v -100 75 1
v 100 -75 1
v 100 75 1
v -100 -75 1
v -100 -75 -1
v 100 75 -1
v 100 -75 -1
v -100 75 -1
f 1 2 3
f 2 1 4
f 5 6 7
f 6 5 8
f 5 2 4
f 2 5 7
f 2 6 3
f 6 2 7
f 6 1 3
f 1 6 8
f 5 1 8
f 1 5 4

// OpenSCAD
// Parameters
sheet_length = 200; //[100:400:1]
sheet_width  = 150; //[75:300:1]
sheet_thickness = 2; //[1:6:0.5]

$fn = 64;

// Final Output: simple rectangular sheet (no holes)
cube([sheet_length, sheet_width, sheet_thickness], center=true);
